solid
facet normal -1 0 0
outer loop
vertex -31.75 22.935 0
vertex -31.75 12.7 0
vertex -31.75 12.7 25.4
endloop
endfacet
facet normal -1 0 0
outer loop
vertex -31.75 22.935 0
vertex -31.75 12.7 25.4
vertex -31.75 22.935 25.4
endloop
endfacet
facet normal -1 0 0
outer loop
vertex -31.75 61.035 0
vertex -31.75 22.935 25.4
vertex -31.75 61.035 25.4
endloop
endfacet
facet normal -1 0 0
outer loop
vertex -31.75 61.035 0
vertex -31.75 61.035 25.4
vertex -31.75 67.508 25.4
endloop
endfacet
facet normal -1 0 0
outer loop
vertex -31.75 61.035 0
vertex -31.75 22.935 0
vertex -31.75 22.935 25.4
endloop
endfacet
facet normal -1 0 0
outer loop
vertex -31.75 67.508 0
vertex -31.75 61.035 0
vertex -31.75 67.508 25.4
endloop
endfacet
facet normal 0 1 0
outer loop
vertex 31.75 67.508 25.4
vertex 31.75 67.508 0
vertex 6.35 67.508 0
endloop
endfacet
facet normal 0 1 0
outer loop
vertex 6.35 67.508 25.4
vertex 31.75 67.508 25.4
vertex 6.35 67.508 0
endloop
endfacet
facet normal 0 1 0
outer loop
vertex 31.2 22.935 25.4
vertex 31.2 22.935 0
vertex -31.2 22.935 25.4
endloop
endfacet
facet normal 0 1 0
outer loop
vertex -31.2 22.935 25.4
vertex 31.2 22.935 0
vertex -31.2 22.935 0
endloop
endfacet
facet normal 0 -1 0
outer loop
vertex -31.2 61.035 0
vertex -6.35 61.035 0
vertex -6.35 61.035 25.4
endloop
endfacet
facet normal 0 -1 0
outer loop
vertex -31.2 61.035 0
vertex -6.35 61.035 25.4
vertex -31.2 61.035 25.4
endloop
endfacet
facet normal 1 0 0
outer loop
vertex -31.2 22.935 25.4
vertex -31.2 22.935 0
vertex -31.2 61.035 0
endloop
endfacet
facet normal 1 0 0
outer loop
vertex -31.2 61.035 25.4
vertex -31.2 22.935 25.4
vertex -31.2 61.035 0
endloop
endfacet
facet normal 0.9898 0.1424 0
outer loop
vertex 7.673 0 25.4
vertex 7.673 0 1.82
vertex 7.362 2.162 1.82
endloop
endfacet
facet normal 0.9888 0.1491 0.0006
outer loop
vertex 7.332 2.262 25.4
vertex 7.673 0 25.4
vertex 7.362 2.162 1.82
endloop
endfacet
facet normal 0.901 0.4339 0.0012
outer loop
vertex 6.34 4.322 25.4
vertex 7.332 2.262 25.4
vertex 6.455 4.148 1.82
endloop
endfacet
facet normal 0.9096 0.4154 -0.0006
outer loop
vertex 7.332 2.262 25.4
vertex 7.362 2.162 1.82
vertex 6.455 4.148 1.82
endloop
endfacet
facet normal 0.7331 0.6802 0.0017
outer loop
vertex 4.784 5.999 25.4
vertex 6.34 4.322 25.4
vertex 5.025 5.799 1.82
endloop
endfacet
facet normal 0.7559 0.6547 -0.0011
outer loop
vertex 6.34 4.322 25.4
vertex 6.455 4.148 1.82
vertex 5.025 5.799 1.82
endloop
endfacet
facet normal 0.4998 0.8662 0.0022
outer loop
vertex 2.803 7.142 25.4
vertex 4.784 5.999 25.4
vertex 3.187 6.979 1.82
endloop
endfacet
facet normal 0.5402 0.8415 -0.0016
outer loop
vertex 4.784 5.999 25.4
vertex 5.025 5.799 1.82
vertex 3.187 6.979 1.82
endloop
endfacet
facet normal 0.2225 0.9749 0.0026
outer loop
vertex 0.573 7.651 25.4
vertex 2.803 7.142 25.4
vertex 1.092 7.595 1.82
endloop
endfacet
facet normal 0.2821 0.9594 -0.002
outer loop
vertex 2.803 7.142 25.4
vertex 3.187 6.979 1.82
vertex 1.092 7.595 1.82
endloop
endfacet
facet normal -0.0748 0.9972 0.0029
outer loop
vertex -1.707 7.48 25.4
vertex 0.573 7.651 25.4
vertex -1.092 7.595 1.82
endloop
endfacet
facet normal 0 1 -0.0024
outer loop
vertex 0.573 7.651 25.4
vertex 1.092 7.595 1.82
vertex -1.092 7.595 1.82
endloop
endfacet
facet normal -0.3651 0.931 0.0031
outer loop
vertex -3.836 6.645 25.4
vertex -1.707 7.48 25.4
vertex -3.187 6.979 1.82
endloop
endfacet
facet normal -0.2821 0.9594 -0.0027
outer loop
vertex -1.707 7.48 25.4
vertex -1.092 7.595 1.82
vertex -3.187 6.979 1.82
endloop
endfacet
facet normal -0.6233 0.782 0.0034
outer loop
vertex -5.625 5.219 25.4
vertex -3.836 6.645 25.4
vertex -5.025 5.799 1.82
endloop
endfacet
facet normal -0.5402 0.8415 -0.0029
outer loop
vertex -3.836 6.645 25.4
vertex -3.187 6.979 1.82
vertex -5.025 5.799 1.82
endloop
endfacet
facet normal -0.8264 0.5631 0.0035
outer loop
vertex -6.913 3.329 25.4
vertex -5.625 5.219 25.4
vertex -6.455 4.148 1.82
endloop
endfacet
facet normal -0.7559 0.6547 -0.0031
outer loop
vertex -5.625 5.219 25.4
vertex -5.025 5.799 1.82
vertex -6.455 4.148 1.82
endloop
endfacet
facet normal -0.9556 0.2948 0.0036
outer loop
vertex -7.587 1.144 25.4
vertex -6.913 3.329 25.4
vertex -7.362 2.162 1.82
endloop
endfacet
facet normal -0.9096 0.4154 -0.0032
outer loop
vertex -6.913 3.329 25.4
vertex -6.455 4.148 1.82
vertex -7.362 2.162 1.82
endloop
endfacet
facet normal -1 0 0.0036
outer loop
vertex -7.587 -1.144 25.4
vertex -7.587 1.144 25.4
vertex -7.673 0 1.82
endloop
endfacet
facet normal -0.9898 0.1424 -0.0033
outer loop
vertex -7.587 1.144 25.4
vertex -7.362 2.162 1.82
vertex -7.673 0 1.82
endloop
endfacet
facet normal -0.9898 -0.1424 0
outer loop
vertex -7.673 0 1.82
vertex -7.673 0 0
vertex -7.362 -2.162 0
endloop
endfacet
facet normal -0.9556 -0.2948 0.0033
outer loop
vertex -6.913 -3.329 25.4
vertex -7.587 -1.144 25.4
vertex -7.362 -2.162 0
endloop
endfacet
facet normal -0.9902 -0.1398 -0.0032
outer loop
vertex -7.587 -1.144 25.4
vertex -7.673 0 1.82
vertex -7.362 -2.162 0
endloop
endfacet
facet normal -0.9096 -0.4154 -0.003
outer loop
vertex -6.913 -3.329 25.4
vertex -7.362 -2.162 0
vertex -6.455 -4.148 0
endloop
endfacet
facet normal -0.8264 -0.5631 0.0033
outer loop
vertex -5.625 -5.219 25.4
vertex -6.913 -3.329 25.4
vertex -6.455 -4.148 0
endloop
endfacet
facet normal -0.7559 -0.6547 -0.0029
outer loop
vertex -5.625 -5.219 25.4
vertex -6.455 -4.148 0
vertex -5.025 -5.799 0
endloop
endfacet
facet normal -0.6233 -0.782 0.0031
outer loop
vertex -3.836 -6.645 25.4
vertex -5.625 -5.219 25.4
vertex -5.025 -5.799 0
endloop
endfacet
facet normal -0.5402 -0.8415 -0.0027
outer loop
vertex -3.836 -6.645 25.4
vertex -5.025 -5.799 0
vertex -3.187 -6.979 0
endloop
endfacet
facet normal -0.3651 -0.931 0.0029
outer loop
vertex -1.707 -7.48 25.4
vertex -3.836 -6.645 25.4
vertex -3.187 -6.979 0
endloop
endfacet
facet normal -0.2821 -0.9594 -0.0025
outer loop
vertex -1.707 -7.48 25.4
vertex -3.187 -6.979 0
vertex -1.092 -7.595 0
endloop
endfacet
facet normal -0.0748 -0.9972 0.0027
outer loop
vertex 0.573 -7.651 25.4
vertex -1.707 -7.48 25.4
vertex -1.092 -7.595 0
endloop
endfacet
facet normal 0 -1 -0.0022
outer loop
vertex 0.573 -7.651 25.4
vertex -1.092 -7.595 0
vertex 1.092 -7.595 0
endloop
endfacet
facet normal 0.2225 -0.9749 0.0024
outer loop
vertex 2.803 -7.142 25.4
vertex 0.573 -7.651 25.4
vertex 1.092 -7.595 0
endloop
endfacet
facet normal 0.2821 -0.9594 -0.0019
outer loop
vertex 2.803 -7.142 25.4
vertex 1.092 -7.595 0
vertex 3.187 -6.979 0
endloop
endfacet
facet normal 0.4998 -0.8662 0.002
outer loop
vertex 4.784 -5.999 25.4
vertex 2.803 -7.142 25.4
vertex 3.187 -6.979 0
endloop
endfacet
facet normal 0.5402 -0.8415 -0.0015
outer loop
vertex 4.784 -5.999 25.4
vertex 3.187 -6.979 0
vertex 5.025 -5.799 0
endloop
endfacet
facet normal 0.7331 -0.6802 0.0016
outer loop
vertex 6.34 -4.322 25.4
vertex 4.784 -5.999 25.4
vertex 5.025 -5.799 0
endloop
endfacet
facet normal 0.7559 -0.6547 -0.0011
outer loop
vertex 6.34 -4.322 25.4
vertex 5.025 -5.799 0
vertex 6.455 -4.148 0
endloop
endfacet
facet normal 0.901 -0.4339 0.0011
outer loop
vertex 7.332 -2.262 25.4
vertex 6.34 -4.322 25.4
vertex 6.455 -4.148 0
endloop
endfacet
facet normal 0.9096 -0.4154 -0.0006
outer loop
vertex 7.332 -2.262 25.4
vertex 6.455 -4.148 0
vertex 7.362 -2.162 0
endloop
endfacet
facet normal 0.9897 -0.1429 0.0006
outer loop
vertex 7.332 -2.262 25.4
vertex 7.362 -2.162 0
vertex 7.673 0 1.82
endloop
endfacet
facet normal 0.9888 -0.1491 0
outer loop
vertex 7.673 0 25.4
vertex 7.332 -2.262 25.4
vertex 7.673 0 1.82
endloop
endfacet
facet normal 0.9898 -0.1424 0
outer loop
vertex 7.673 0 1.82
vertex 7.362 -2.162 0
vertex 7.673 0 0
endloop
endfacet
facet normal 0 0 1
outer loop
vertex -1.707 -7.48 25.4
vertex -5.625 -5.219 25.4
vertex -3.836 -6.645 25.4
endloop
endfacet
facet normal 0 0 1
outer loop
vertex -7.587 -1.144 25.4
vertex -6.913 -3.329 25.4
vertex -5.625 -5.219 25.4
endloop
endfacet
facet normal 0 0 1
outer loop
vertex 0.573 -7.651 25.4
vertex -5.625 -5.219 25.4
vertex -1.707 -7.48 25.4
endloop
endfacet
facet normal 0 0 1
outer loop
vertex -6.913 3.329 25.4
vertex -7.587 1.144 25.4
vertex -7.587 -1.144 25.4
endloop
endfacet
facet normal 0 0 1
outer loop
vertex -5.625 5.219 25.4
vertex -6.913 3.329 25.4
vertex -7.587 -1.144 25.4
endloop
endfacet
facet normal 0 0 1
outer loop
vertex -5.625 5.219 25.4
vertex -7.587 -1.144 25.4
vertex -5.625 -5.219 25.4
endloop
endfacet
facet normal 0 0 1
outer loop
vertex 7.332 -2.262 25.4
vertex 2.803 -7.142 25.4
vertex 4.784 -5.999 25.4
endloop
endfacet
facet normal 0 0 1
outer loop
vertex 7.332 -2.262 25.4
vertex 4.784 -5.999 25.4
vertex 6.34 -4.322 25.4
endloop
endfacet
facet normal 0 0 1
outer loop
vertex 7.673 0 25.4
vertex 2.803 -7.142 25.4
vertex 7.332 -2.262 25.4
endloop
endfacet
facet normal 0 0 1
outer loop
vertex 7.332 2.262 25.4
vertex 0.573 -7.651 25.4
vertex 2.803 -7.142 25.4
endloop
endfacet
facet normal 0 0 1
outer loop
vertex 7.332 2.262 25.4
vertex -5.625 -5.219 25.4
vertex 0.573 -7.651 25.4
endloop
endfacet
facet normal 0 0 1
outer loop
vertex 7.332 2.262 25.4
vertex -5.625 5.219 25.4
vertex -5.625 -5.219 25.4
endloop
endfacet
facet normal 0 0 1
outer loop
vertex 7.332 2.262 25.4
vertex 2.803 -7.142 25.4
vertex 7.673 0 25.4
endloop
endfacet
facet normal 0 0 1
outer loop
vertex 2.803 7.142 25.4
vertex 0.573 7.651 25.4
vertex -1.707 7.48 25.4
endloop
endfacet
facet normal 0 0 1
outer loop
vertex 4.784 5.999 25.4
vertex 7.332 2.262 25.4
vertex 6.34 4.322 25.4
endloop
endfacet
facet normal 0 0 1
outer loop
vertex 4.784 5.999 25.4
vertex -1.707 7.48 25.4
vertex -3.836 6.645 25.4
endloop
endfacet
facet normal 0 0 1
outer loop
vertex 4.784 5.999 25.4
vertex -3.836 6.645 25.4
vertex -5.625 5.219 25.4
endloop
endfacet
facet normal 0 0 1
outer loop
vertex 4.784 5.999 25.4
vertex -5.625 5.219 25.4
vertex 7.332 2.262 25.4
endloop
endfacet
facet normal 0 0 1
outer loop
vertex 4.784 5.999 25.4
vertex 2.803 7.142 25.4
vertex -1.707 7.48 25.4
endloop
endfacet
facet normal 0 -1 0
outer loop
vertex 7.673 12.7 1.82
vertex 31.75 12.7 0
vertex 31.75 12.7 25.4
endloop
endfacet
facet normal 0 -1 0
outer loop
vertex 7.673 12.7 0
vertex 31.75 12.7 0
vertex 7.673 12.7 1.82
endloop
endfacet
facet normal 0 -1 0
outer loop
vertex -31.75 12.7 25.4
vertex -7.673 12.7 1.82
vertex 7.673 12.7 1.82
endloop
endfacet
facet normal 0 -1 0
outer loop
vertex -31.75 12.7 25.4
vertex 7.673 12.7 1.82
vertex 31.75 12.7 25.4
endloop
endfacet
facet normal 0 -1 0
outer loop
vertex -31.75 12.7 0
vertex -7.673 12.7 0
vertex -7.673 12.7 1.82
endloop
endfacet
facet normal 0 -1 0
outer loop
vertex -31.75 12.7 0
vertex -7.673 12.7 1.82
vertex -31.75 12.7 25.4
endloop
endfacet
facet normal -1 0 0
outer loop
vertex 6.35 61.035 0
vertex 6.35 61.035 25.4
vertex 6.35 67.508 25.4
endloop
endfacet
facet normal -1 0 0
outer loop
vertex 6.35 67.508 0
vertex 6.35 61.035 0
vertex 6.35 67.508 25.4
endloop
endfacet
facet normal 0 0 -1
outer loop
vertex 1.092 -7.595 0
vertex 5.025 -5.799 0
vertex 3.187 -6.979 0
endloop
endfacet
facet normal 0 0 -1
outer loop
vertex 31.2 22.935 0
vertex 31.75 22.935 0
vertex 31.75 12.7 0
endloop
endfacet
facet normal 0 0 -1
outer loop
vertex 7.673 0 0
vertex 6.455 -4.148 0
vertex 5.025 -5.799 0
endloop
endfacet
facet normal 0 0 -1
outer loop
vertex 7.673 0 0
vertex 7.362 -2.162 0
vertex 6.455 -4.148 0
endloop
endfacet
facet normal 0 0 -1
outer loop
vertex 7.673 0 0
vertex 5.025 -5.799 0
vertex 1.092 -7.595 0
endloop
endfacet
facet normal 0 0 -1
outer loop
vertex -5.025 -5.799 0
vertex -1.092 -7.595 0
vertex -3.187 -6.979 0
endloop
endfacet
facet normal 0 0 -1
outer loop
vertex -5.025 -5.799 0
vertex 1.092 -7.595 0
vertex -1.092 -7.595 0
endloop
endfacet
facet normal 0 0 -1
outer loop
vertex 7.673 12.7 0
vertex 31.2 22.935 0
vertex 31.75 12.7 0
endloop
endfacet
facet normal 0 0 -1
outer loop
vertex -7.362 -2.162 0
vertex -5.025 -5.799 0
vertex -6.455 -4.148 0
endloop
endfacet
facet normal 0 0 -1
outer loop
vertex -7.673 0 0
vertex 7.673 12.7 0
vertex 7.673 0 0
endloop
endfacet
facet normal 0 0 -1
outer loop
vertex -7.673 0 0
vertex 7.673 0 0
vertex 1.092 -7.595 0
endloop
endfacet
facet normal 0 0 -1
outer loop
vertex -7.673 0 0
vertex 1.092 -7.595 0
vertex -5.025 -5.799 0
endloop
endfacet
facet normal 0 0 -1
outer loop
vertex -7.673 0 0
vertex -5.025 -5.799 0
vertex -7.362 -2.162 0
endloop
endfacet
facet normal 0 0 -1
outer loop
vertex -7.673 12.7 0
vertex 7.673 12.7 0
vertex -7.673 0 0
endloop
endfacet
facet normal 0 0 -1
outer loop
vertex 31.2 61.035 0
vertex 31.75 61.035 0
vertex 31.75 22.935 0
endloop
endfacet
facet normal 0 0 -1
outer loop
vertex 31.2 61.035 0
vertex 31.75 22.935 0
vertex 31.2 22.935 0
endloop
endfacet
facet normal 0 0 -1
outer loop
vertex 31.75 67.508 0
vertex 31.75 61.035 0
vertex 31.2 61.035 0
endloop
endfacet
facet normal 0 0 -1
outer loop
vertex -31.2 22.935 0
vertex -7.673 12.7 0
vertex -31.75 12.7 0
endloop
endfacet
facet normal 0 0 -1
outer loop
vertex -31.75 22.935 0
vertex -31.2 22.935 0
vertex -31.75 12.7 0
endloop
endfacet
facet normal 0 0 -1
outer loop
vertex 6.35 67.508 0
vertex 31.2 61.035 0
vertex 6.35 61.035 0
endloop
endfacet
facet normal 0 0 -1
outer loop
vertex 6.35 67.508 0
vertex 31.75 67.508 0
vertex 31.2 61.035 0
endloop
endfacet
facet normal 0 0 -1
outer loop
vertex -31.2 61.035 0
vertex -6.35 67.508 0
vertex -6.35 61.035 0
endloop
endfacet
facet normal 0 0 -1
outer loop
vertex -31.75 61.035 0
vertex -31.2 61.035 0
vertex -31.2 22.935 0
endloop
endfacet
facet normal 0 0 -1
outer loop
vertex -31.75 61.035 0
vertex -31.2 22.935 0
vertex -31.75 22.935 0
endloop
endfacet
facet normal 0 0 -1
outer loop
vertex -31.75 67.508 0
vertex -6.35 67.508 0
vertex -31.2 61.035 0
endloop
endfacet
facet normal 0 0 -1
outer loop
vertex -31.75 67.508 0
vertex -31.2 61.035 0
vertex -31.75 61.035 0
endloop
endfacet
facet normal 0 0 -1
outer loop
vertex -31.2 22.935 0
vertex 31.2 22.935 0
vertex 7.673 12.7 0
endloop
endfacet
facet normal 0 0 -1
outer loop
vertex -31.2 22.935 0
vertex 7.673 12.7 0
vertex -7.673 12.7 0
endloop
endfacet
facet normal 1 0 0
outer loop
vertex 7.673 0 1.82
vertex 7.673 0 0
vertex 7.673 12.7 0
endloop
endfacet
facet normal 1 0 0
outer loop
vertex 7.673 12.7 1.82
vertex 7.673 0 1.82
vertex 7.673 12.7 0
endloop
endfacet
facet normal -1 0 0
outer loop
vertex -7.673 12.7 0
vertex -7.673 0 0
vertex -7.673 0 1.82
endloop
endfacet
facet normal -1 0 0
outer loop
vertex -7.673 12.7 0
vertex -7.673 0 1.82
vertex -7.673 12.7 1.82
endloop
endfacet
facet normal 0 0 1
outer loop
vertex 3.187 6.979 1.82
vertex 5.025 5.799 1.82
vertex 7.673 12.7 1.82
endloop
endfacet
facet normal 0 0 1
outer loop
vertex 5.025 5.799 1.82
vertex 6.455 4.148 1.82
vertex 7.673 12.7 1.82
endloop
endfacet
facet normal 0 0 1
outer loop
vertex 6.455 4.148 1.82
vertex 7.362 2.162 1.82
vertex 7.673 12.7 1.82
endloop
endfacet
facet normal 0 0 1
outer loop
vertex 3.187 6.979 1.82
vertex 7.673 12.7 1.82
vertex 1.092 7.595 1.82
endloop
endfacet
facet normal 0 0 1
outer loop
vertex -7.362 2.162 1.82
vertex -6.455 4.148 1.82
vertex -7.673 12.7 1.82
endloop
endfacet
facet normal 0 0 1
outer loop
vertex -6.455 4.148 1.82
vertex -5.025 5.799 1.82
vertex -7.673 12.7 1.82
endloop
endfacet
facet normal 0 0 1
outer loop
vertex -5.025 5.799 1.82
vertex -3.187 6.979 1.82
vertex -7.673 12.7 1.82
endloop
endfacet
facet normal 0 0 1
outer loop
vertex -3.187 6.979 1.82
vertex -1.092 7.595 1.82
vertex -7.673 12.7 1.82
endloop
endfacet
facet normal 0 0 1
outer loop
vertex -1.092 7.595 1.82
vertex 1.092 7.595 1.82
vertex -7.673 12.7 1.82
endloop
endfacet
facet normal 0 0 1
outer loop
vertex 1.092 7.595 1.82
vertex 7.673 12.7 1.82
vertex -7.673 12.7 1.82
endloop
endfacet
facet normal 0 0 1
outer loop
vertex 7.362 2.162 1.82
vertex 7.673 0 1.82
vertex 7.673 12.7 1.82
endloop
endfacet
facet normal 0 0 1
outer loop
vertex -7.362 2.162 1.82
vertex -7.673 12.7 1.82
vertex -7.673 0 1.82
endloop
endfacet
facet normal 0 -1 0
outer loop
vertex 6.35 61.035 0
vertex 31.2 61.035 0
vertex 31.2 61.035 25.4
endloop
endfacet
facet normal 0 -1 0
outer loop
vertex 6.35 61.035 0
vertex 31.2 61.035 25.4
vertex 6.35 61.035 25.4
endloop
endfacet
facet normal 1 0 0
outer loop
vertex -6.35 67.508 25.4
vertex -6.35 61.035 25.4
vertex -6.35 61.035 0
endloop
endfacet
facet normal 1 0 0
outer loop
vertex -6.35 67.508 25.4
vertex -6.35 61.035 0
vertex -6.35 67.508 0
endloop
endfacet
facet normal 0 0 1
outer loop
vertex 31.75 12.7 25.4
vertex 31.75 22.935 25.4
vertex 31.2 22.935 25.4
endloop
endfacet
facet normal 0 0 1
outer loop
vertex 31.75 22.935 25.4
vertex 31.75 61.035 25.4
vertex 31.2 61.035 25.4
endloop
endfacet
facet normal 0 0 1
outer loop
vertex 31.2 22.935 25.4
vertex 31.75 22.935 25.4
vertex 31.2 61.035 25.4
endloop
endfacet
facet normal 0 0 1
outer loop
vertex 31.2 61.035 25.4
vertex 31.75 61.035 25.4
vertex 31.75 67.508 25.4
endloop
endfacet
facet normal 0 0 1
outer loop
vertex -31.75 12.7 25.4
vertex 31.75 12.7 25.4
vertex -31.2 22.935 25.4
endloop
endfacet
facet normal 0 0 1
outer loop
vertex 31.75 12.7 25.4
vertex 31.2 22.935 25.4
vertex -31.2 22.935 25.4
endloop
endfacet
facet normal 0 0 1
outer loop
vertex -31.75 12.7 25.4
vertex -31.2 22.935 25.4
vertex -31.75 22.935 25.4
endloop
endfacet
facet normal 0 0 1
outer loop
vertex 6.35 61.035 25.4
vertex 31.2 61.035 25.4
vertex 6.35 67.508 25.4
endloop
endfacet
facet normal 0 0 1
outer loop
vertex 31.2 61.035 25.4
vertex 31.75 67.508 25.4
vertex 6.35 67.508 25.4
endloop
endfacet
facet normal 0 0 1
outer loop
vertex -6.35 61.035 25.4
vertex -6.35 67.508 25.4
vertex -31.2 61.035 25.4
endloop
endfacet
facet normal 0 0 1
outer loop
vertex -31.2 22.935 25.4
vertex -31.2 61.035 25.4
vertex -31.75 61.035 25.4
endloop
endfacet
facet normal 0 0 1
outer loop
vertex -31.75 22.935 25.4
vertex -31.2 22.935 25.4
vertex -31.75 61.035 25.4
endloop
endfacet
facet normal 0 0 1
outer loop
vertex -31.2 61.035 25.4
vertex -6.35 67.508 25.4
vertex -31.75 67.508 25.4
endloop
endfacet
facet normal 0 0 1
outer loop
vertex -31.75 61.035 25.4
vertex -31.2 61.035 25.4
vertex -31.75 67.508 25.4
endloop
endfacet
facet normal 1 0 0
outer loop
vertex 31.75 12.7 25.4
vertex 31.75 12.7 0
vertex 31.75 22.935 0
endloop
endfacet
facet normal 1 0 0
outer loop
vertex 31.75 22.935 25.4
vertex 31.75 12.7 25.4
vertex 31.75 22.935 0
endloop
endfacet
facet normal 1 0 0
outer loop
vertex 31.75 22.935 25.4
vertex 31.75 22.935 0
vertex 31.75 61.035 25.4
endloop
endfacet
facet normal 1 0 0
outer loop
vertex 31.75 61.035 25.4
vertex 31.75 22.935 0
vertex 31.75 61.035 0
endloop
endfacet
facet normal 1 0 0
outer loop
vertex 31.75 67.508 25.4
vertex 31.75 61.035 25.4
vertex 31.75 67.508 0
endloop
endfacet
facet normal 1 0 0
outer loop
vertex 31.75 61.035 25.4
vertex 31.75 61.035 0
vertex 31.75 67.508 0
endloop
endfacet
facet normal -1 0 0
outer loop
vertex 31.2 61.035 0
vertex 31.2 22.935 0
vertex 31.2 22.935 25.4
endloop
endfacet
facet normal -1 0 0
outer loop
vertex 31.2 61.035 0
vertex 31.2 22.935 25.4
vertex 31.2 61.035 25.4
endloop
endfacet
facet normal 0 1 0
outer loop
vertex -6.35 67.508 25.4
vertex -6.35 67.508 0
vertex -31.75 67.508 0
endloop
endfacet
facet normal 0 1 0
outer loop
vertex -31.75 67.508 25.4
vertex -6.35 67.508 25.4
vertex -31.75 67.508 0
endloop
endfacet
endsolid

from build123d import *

# Parameters (mm, degrees)
SKETCH1_R           = 7.672873739
BOSS_EXTRUDE1_DEPTH = 25.4
SKETCH2_W           = 15.345747478
SKETCH2_H           = 12.7
BOSS_EXTRUDE2_DEPTH = 1.820422808
BOSS_EXTRUDE3_DEPTH = 25.4
SKETCH5_W           = 0.549916313
SKETCH5_H           = 38.1
BOSS_EXTRUDE4_DEPTH = 25.4
SKETCH6_W           = 25.4
SKETCH6_H           = 6.473300788
BOSS_EXTRUDE5_DEPTH = 25.4


with BuildPart() as part:
    # Sketch1 → Boss-Extrude1 (new body)
    with BuildSketch(Plane.XY):
        Circle(SKETCH1_R)
    extrude(amount=BOSS_EXTRUDE1_DEPTH)

    # Sketch2 → Boss-Extrude2 (add)
    with BuildSketch(Plane(origin=(0, 0, 0), x_dir=(-1, 0, 0), z_dir=(0, 0, -1))):
        with Locations((0, 6.35)):
            Rectangle(SKETCH2_W, SKETCH2_H)
    extrude(amount=-BOSS_EXTRUDE2_DEPTH)

    # Sketch4 → Boss-Extrude3 (add)
    with BuildSketch(Plane(origin=(0, 0, 0), x_dir=(-1, 0, 0), z_dir=(0, 0, -1))):
        Polygon((-31.75, 12.7), (-31.75, 22.935187234), (31.75, 22.935187234), (31.75, 12.7), (7.672873739, 12.7), (-7.672873739, 12.7), align=None)
    extrude(amount=-BOSS_EXTRUDE3_DEPTH)

    # Sketch5 → Boss-Extrude4 (add)
    with BuildSketch(Plane(origin=(0, 0, 0), x_dir=(-1, 0, 0), z_dir=(0, 0, -1))):
        with Locations((31.475041844, 41.985187234)):
            Rectangle(SKETCH5_W, SKETCH5_H)
        with Locations((-31.475041844, 41.985187234)):
            Rectangle(SKETCH5_W, SKETCH5_H)
    extrude(amount=-BOSS_EXTRUDE4_DEPTH)

    # Sketch6 → Boss-Extrude5 (add)
    with BuildSketch(Plane(origin=(0, 0, 0), x_dir=(-1, 0, 0), z_dir=(0, 0, -1))):
        with Locations((19.05, 64.271837628)):
            Rectangle(SKETCH6_W, SKETCH6_H)
        with Locations((-19.05, 64.271837628)):
            Rectangle(SKETCH6_W, SKETCH6_H)
    extrude(amount=-BOSS_EXTRUDE5_DEPTH)


solid = part.part
